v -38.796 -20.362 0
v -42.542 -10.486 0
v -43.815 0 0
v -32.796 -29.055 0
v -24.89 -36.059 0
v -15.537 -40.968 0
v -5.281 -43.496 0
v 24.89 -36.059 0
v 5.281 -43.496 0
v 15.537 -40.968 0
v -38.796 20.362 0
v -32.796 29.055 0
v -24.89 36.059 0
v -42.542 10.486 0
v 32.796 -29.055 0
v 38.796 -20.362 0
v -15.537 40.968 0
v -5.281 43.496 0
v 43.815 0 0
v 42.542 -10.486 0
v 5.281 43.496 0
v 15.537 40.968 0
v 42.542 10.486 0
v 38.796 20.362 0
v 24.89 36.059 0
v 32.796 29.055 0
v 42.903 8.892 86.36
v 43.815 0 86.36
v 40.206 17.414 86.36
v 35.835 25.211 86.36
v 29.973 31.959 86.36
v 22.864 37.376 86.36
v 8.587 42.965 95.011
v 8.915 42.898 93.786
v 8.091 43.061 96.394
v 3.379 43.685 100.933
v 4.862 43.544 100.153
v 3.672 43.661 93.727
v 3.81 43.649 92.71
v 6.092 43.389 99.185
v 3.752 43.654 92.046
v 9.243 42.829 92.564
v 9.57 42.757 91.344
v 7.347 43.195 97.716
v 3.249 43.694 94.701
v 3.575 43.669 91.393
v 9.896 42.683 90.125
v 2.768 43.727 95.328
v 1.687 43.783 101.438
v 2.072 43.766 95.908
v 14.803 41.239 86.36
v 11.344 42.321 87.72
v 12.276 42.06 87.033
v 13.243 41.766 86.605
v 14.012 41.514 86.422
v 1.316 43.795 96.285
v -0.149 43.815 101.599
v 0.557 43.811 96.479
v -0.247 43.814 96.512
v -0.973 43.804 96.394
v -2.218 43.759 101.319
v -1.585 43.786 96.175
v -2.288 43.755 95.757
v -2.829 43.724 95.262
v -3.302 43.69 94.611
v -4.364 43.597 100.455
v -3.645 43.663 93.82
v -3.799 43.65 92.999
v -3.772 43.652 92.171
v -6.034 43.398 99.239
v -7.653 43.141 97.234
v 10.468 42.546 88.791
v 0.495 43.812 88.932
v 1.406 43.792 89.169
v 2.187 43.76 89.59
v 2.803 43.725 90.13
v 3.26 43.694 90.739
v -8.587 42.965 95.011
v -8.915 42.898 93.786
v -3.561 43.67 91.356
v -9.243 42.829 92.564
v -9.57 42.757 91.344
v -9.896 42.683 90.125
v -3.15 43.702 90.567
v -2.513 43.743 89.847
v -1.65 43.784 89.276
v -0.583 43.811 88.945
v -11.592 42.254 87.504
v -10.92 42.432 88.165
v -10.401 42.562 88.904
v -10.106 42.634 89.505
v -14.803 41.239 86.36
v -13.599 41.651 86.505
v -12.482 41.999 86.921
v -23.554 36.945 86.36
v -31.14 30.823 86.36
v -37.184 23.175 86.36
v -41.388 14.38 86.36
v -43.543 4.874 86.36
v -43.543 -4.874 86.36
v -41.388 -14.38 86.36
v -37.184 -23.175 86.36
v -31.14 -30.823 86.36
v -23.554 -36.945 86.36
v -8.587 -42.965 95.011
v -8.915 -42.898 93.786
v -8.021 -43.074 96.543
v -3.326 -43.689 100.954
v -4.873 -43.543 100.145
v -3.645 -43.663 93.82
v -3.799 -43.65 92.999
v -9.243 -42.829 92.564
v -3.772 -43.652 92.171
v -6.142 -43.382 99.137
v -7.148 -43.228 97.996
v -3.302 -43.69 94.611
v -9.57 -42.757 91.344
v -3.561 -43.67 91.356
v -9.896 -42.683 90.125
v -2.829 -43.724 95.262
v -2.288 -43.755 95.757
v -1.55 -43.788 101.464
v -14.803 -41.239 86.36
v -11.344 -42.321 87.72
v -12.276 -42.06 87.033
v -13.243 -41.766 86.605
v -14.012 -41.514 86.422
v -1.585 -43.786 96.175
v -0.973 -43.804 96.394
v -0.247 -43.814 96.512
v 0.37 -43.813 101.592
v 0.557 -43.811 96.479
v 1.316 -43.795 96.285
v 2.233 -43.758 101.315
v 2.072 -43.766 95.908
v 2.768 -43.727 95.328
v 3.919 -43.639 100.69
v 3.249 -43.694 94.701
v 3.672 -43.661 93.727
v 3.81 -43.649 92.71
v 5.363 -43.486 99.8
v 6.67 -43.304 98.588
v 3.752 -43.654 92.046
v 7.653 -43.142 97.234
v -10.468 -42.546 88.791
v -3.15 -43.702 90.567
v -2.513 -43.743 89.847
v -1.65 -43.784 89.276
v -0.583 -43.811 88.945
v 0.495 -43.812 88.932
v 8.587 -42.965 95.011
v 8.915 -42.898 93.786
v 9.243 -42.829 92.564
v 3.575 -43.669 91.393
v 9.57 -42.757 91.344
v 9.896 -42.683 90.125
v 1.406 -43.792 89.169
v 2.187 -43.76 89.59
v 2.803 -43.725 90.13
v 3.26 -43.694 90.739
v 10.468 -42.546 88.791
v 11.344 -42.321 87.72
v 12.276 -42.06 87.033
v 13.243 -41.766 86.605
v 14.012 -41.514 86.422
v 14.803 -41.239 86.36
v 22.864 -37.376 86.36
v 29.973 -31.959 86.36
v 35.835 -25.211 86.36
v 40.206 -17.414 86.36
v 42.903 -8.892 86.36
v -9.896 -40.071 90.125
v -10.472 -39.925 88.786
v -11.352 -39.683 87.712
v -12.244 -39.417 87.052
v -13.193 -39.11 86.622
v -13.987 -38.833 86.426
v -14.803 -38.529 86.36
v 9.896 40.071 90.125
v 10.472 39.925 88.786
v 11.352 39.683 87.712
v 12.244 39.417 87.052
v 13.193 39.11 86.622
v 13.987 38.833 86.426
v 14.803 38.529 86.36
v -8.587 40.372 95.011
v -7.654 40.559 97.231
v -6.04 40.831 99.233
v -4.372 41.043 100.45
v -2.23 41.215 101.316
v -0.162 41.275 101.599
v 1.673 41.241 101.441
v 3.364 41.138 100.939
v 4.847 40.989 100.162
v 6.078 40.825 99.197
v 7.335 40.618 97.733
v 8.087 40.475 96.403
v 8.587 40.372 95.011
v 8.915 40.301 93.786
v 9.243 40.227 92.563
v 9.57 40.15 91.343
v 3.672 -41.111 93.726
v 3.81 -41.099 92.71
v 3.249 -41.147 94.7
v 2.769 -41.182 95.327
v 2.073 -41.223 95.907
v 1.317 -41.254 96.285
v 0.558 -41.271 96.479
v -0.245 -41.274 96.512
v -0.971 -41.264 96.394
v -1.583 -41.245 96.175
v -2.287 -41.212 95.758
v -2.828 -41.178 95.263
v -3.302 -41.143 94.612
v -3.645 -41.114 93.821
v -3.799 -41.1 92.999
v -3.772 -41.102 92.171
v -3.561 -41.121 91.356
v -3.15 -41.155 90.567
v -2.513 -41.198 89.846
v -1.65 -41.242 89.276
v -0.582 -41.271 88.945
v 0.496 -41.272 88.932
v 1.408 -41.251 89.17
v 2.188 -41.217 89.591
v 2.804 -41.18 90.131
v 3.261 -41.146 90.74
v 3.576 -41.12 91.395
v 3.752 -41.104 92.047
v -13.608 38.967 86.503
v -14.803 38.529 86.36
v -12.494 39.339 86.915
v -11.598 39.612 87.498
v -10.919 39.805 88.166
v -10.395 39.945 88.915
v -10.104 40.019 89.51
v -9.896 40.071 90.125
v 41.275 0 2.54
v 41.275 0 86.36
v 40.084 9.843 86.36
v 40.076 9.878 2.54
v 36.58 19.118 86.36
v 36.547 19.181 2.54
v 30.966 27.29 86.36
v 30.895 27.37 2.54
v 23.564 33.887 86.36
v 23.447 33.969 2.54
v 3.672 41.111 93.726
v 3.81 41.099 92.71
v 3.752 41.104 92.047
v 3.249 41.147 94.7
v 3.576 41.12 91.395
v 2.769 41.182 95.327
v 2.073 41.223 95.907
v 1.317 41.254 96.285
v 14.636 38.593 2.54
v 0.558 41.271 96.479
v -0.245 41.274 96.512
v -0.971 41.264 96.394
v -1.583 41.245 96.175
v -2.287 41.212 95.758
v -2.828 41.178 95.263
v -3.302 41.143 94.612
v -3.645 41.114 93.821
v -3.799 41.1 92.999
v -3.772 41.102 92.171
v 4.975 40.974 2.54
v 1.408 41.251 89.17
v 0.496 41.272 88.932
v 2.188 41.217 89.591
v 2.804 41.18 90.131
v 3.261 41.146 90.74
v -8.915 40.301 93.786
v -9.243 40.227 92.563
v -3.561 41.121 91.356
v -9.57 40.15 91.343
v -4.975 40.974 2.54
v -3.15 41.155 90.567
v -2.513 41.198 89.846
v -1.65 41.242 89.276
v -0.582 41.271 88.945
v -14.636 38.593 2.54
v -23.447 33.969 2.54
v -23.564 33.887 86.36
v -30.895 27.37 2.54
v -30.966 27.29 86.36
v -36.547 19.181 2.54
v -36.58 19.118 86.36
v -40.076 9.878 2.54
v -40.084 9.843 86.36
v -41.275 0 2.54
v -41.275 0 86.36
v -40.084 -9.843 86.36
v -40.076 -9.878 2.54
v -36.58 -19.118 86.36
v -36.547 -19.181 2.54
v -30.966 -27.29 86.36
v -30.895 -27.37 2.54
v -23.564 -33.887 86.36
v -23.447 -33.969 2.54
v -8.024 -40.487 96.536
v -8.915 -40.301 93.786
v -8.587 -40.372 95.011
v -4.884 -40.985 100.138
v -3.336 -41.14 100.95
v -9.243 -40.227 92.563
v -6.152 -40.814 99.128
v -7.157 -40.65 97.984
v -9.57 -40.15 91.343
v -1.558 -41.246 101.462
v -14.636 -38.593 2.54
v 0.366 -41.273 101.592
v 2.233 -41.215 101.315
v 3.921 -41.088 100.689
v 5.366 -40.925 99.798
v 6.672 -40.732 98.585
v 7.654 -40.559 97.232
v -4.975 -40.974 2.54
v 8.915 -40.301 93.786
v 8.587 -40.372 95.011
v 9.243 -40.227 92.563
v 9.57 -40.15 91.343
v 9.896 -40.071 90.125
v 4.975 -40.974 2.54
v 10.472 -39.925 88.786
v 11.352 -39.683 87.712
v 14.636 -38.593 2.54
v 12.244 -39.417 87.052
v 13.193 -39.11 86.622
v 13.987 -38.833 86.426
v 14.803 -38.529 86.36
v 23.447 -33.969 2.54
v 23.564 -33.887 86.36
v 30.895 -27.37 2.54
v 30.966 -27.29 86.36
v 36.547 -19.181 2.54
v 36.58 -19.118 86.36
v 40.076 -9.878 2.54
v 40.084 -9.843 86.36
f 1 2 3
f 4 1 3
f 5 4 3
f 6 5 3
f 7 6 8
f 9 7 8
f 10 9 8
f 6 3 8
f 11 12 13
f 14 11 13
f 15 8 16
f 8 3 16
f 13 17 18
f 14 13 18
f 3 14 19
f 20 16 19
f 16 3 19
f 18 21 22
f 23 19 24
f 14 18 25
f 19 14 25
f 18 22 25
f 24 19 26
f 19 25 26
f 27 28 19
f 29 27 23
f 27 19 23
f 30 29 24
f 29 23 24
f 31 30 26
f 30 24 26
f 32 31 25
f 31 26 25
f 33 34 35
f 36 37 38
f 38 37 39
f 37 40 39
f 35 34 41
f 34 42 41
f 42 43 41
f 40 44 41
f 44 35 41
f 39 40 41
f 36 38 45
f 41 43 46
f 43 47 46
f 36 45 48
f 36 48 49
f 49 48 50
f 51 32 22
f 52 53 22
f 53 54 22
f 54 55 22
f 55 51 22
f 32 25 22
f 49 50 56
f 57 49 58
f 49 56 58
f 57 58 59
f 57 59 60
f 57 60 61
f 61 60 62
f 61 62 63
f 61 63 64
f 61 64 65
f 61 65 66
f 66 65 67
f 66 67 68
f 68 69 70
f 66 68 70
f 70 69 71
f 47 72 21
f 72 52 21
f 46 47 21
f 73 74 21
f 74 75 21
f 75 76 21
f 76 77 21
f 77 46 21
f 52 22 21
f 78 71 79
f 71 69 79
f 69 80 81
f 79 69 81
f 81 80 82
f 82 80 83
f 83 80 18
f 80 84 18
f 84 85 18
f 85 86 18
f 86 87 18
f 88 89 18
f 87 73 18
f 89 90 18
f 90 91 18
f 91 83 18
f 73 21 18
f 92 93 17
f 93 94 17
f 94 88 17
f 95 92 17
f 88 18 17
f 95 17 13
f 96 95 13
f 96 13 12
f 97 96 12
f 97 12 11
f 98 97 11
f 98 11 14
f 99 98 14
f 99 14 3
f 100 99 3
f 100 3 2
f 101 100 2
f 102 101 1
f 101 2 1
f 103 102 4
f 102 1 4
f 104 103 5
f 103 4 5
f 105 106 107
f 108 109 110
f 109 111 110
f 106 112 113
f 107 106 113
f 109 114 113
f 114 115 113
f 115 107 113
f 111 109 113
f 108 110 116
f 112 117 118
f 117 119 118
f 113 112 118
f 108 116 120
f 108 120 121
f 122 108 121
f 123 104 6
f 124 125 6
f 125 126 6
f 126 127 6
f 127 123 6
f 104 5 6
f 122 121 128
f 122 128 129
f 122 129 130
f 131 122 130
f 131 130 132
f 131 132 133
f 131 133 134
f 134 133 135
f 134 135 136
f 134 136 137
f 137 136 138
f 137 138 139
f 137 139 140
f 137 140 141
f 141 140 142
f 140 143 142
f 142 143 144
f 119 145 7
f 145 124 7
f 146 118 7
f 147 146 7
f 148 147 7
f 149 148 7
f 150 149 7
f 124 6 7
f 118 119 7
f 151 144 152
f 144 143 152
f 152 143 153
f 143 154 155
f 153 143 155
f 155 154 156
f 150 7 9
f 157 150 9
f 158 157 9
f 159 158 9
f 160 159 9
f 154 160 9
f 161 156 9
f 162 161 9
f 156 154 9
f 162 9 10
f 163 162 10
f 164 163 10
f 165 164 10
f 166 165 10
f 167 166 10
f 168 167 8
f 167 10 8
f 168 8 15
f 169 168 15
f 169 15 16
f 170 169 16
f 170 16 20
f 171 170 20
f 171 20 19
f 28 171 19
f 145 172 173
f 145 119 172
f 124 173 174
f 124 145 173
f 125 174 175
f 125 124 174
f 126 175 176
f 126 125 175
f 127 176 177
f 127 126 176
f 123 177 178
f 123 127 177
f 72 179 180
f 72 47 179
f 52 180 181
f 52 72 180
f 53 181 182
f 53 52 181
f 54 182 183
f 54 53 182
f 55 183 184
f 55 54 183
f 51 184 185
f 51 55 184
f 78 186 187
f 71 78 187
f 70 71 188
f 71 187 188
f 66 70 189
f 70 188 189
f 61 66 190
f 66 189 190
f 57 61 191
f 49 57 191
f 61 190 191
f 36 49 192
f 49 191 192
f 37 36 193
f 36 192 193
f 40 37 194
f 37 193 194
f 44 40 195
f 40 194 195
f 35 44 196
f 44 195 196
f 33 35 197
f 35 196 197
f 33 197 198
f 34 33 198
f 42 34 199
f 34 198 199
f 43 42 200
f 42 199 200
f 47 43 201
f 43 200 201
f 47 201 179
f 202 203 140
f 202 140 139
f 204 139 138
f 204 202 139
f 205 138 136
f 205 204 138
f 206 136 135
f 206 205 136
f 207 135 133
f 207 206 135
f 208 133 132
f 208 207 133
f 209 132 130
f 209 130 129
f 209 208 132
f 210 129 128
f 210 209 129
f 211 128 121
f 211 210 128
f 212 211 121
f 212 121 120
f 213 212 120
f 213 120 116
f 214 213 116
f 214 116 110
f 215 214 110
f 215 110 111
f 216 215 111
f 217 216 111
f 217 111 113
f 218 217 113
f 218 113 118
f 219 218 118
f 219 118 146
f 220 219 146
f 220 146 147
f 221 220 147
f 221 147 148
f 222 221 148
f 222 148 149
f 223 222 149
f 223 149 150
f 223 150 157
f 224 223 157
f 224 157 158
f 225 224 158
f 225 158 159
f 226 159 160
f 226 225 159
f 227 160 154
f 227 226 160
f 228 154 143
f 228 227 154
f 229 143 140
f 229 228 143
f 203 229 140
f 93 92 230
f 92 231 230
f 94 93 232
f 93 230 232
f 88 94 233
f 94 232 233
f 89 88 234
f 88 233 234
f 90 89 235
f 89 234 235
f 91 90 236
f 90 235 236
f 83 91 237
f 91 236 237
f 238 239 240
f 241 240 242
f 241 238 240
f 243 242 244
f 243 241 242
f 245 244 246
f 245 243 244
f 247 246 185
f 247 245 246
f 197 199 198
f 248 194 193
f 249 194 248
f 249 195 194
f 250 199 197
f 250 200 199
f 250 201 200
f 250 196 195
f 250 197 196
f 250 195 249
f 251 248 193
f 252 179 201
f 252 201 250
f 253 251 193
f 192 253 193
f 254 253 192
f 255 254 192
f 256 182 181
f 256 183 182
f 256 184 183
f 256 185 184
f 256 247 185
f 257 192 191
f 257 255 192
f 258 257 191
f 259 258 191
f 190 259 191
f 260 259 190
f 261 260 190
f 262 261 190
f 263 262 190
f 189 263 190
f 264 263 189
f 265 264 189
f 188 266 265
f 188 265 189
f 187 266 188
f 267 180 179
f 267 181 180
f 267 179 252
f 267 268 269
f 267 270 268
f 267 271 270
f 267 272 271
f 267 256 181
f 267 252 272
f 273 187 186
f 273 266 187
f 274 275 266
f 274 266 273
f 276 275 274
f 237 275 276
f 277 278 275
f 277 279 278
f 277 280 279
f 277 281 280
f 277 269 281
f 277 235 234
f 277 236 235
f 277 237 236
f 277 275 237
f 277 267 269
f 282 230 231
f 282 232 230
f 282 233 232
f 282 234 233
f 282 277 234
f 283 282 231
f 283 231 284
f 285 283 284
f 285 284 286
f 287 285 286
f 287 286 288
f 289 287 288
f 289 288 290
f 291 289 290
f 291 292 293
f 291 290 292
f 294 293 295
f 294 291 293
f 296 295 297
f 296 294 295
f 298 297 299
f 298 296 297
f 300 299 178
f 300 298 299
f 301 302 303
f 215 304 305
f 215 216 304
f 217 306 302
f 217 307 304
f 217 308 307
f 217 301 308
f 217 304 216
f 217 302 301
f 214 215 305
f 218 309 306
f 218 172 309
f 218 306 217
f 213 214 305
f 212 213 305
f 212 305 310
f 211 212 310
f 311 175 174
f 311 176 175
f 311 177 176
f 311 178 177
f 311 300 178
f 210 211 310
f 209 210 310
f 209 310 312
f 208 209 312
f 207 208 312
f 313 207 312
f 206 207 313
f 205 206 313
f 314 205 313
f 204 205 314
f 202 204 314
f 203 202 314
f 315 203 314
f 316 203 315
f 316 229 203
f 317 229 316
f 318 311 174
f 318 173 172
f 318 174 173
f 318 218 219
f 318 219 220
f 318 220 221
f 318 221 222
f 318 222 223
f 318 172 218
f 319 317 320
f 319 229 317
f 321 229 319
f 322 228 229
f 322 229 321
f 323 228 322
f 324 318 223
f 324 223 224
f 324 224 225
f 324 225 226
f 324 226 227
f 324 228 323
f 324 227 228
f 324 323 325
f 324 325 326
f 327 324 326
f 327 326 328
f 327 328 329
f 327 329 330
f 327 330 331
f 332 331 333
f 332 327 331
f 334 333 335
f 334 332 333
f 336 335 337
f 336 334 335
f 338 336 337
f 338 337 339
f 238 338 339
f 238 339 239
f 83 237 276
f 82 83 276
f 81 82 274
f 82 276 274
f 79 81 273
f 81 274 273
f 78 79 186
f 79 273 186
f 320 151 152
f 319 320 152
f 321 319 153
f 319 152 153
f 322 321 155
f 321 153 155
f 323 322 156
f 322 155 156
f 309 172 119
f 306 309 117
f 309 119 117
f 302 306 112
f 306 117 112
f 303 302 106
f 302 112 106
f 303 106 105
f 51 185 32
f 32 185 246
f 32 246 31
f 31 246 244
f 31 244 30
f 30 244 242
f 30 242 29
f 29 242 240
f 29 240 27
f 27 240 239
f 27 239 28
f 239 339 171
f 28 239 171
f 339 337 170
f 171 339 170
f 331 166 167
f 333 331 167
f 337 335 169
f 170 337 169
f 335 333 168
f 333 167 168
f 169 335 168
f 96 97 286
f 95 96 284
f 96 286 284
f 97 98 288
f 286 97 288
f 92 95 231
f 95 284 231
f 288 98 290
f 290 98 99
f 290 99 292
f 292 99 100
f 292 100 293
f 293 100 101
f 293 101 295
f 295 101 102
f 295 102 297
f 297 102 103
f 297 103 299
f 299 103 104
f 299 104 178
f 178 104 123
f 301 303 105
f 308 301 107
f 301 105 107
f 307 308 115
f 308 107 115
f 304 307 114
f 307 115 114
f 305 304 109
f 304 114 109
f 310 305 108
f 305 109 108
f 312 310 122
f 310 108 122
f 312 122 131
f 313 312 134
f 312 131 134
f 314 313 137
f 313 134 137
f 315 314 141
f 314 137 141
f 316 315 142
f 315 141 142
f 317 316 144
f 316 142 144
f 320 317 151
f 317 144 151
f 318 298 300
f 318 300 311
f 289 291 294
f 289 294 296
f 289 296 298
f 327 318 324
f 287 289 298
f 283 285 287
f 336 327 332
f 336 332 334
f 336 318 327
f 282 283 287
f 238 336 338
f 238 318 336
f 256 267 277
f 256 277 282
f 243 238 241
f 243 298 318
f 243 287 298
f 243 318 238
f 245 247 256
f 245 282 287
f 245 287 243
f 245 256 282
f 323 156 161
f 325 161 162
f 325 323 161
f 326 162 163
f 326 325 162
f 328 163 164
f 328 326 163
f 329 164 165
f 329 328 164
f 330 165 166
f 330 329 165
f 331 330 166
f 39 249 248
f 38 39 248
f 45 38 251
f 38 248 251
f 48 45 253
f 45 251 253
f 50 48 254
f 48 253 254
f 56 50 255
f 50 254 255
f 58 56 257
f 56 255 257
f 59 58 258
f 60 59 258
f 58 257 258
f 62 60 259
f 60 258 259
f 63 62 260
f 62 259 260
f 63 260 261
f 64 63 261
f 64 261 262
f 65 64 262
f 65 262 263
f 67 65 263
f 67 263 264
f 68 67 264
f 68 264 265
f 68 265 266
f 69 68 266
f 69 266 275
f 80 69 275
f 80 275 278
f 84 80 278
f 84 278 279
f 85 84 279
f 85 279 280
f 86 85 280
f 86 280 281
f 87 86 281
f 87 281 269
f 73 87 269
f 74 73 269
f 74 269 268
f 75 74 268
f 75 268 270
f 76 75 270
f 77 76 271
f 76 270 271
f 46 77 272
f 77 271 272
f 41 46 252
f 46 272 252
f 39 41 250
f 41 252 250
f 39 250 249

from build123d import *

# Parameters (mm, degrees)
F1_R     = 43.815
F1_R_2   = 41.275
F2_DEPTH = 101.6
F3_DEPTH = 2.54
F4_R     = 3.81
F5_DEPTH = 57.658
F6_R     = 5.08


# Not quite as in the source:
# - a variable given as a bare number and used for a length is read in inches; the dataset says mm whatever the document's units were


with BuildPart() as f2:
    # F1 (on Top) → F2 (new body)
    with BuildSketch(Plane.XY):
        Circle(F1_R)
        Circle(F1_R_2, mode=Mode.SUBTRACT)
    extrude(amount=F2_DEPTH)

    # F1 (on Top) → F3 (join)
    with BuildSketch(Plane.XY):
        Circle(F1_R_2)
    extrude(amount=F3_DEPTH)

    # F4 (on Front) → F5 (cut, symmetric)
    with BuildSketch(Plane.XZ):
        with Locations((0, 92.71)):
            Circle(F4_R)
        with BuildLine():
            Line((46.664010312, 104.1751918972), (-46.664010312, 104.1751918972))
            Line((-46.664010312, 104.1751918972), (-46.664010312, 86.36))
            Line((-46.664010312, 86.36), (-10.9050826158, 86.36))
            Line((-10.9050826158, 86.36), (-8.5870805957, 95.010901311))
            ThreePointArc((-8.5870805957, 95.010901311), (0, 101.6), (8.5870805957, 95.010901311))
            Line((8.5870805957, 95.010901311), (10.9050826158, 86.36))
            Line((10.9050826158, 86.36), (46.664010312, 86.36))
            Line((46.664010312, 86.36), (46.664010312, 104.1751918972))
        make_face()
    extrude(amount=F5_DEPTH, both=True, mode=Mode.SUBTRACT)

    # F6
    f6_edges = [f2.edges().sort_by_distance(p)[0] for p in [
        (10.905083, -41.122289, 86.36),
        (10.905083, 41.122289, 86.36),
        (-10.905083, -41.122289, 86.36),
        (-10.905083, 41.122289, 86.36),
    ]]
    fillet(f6_edges, radius=F6_R)


solid = f2.part
